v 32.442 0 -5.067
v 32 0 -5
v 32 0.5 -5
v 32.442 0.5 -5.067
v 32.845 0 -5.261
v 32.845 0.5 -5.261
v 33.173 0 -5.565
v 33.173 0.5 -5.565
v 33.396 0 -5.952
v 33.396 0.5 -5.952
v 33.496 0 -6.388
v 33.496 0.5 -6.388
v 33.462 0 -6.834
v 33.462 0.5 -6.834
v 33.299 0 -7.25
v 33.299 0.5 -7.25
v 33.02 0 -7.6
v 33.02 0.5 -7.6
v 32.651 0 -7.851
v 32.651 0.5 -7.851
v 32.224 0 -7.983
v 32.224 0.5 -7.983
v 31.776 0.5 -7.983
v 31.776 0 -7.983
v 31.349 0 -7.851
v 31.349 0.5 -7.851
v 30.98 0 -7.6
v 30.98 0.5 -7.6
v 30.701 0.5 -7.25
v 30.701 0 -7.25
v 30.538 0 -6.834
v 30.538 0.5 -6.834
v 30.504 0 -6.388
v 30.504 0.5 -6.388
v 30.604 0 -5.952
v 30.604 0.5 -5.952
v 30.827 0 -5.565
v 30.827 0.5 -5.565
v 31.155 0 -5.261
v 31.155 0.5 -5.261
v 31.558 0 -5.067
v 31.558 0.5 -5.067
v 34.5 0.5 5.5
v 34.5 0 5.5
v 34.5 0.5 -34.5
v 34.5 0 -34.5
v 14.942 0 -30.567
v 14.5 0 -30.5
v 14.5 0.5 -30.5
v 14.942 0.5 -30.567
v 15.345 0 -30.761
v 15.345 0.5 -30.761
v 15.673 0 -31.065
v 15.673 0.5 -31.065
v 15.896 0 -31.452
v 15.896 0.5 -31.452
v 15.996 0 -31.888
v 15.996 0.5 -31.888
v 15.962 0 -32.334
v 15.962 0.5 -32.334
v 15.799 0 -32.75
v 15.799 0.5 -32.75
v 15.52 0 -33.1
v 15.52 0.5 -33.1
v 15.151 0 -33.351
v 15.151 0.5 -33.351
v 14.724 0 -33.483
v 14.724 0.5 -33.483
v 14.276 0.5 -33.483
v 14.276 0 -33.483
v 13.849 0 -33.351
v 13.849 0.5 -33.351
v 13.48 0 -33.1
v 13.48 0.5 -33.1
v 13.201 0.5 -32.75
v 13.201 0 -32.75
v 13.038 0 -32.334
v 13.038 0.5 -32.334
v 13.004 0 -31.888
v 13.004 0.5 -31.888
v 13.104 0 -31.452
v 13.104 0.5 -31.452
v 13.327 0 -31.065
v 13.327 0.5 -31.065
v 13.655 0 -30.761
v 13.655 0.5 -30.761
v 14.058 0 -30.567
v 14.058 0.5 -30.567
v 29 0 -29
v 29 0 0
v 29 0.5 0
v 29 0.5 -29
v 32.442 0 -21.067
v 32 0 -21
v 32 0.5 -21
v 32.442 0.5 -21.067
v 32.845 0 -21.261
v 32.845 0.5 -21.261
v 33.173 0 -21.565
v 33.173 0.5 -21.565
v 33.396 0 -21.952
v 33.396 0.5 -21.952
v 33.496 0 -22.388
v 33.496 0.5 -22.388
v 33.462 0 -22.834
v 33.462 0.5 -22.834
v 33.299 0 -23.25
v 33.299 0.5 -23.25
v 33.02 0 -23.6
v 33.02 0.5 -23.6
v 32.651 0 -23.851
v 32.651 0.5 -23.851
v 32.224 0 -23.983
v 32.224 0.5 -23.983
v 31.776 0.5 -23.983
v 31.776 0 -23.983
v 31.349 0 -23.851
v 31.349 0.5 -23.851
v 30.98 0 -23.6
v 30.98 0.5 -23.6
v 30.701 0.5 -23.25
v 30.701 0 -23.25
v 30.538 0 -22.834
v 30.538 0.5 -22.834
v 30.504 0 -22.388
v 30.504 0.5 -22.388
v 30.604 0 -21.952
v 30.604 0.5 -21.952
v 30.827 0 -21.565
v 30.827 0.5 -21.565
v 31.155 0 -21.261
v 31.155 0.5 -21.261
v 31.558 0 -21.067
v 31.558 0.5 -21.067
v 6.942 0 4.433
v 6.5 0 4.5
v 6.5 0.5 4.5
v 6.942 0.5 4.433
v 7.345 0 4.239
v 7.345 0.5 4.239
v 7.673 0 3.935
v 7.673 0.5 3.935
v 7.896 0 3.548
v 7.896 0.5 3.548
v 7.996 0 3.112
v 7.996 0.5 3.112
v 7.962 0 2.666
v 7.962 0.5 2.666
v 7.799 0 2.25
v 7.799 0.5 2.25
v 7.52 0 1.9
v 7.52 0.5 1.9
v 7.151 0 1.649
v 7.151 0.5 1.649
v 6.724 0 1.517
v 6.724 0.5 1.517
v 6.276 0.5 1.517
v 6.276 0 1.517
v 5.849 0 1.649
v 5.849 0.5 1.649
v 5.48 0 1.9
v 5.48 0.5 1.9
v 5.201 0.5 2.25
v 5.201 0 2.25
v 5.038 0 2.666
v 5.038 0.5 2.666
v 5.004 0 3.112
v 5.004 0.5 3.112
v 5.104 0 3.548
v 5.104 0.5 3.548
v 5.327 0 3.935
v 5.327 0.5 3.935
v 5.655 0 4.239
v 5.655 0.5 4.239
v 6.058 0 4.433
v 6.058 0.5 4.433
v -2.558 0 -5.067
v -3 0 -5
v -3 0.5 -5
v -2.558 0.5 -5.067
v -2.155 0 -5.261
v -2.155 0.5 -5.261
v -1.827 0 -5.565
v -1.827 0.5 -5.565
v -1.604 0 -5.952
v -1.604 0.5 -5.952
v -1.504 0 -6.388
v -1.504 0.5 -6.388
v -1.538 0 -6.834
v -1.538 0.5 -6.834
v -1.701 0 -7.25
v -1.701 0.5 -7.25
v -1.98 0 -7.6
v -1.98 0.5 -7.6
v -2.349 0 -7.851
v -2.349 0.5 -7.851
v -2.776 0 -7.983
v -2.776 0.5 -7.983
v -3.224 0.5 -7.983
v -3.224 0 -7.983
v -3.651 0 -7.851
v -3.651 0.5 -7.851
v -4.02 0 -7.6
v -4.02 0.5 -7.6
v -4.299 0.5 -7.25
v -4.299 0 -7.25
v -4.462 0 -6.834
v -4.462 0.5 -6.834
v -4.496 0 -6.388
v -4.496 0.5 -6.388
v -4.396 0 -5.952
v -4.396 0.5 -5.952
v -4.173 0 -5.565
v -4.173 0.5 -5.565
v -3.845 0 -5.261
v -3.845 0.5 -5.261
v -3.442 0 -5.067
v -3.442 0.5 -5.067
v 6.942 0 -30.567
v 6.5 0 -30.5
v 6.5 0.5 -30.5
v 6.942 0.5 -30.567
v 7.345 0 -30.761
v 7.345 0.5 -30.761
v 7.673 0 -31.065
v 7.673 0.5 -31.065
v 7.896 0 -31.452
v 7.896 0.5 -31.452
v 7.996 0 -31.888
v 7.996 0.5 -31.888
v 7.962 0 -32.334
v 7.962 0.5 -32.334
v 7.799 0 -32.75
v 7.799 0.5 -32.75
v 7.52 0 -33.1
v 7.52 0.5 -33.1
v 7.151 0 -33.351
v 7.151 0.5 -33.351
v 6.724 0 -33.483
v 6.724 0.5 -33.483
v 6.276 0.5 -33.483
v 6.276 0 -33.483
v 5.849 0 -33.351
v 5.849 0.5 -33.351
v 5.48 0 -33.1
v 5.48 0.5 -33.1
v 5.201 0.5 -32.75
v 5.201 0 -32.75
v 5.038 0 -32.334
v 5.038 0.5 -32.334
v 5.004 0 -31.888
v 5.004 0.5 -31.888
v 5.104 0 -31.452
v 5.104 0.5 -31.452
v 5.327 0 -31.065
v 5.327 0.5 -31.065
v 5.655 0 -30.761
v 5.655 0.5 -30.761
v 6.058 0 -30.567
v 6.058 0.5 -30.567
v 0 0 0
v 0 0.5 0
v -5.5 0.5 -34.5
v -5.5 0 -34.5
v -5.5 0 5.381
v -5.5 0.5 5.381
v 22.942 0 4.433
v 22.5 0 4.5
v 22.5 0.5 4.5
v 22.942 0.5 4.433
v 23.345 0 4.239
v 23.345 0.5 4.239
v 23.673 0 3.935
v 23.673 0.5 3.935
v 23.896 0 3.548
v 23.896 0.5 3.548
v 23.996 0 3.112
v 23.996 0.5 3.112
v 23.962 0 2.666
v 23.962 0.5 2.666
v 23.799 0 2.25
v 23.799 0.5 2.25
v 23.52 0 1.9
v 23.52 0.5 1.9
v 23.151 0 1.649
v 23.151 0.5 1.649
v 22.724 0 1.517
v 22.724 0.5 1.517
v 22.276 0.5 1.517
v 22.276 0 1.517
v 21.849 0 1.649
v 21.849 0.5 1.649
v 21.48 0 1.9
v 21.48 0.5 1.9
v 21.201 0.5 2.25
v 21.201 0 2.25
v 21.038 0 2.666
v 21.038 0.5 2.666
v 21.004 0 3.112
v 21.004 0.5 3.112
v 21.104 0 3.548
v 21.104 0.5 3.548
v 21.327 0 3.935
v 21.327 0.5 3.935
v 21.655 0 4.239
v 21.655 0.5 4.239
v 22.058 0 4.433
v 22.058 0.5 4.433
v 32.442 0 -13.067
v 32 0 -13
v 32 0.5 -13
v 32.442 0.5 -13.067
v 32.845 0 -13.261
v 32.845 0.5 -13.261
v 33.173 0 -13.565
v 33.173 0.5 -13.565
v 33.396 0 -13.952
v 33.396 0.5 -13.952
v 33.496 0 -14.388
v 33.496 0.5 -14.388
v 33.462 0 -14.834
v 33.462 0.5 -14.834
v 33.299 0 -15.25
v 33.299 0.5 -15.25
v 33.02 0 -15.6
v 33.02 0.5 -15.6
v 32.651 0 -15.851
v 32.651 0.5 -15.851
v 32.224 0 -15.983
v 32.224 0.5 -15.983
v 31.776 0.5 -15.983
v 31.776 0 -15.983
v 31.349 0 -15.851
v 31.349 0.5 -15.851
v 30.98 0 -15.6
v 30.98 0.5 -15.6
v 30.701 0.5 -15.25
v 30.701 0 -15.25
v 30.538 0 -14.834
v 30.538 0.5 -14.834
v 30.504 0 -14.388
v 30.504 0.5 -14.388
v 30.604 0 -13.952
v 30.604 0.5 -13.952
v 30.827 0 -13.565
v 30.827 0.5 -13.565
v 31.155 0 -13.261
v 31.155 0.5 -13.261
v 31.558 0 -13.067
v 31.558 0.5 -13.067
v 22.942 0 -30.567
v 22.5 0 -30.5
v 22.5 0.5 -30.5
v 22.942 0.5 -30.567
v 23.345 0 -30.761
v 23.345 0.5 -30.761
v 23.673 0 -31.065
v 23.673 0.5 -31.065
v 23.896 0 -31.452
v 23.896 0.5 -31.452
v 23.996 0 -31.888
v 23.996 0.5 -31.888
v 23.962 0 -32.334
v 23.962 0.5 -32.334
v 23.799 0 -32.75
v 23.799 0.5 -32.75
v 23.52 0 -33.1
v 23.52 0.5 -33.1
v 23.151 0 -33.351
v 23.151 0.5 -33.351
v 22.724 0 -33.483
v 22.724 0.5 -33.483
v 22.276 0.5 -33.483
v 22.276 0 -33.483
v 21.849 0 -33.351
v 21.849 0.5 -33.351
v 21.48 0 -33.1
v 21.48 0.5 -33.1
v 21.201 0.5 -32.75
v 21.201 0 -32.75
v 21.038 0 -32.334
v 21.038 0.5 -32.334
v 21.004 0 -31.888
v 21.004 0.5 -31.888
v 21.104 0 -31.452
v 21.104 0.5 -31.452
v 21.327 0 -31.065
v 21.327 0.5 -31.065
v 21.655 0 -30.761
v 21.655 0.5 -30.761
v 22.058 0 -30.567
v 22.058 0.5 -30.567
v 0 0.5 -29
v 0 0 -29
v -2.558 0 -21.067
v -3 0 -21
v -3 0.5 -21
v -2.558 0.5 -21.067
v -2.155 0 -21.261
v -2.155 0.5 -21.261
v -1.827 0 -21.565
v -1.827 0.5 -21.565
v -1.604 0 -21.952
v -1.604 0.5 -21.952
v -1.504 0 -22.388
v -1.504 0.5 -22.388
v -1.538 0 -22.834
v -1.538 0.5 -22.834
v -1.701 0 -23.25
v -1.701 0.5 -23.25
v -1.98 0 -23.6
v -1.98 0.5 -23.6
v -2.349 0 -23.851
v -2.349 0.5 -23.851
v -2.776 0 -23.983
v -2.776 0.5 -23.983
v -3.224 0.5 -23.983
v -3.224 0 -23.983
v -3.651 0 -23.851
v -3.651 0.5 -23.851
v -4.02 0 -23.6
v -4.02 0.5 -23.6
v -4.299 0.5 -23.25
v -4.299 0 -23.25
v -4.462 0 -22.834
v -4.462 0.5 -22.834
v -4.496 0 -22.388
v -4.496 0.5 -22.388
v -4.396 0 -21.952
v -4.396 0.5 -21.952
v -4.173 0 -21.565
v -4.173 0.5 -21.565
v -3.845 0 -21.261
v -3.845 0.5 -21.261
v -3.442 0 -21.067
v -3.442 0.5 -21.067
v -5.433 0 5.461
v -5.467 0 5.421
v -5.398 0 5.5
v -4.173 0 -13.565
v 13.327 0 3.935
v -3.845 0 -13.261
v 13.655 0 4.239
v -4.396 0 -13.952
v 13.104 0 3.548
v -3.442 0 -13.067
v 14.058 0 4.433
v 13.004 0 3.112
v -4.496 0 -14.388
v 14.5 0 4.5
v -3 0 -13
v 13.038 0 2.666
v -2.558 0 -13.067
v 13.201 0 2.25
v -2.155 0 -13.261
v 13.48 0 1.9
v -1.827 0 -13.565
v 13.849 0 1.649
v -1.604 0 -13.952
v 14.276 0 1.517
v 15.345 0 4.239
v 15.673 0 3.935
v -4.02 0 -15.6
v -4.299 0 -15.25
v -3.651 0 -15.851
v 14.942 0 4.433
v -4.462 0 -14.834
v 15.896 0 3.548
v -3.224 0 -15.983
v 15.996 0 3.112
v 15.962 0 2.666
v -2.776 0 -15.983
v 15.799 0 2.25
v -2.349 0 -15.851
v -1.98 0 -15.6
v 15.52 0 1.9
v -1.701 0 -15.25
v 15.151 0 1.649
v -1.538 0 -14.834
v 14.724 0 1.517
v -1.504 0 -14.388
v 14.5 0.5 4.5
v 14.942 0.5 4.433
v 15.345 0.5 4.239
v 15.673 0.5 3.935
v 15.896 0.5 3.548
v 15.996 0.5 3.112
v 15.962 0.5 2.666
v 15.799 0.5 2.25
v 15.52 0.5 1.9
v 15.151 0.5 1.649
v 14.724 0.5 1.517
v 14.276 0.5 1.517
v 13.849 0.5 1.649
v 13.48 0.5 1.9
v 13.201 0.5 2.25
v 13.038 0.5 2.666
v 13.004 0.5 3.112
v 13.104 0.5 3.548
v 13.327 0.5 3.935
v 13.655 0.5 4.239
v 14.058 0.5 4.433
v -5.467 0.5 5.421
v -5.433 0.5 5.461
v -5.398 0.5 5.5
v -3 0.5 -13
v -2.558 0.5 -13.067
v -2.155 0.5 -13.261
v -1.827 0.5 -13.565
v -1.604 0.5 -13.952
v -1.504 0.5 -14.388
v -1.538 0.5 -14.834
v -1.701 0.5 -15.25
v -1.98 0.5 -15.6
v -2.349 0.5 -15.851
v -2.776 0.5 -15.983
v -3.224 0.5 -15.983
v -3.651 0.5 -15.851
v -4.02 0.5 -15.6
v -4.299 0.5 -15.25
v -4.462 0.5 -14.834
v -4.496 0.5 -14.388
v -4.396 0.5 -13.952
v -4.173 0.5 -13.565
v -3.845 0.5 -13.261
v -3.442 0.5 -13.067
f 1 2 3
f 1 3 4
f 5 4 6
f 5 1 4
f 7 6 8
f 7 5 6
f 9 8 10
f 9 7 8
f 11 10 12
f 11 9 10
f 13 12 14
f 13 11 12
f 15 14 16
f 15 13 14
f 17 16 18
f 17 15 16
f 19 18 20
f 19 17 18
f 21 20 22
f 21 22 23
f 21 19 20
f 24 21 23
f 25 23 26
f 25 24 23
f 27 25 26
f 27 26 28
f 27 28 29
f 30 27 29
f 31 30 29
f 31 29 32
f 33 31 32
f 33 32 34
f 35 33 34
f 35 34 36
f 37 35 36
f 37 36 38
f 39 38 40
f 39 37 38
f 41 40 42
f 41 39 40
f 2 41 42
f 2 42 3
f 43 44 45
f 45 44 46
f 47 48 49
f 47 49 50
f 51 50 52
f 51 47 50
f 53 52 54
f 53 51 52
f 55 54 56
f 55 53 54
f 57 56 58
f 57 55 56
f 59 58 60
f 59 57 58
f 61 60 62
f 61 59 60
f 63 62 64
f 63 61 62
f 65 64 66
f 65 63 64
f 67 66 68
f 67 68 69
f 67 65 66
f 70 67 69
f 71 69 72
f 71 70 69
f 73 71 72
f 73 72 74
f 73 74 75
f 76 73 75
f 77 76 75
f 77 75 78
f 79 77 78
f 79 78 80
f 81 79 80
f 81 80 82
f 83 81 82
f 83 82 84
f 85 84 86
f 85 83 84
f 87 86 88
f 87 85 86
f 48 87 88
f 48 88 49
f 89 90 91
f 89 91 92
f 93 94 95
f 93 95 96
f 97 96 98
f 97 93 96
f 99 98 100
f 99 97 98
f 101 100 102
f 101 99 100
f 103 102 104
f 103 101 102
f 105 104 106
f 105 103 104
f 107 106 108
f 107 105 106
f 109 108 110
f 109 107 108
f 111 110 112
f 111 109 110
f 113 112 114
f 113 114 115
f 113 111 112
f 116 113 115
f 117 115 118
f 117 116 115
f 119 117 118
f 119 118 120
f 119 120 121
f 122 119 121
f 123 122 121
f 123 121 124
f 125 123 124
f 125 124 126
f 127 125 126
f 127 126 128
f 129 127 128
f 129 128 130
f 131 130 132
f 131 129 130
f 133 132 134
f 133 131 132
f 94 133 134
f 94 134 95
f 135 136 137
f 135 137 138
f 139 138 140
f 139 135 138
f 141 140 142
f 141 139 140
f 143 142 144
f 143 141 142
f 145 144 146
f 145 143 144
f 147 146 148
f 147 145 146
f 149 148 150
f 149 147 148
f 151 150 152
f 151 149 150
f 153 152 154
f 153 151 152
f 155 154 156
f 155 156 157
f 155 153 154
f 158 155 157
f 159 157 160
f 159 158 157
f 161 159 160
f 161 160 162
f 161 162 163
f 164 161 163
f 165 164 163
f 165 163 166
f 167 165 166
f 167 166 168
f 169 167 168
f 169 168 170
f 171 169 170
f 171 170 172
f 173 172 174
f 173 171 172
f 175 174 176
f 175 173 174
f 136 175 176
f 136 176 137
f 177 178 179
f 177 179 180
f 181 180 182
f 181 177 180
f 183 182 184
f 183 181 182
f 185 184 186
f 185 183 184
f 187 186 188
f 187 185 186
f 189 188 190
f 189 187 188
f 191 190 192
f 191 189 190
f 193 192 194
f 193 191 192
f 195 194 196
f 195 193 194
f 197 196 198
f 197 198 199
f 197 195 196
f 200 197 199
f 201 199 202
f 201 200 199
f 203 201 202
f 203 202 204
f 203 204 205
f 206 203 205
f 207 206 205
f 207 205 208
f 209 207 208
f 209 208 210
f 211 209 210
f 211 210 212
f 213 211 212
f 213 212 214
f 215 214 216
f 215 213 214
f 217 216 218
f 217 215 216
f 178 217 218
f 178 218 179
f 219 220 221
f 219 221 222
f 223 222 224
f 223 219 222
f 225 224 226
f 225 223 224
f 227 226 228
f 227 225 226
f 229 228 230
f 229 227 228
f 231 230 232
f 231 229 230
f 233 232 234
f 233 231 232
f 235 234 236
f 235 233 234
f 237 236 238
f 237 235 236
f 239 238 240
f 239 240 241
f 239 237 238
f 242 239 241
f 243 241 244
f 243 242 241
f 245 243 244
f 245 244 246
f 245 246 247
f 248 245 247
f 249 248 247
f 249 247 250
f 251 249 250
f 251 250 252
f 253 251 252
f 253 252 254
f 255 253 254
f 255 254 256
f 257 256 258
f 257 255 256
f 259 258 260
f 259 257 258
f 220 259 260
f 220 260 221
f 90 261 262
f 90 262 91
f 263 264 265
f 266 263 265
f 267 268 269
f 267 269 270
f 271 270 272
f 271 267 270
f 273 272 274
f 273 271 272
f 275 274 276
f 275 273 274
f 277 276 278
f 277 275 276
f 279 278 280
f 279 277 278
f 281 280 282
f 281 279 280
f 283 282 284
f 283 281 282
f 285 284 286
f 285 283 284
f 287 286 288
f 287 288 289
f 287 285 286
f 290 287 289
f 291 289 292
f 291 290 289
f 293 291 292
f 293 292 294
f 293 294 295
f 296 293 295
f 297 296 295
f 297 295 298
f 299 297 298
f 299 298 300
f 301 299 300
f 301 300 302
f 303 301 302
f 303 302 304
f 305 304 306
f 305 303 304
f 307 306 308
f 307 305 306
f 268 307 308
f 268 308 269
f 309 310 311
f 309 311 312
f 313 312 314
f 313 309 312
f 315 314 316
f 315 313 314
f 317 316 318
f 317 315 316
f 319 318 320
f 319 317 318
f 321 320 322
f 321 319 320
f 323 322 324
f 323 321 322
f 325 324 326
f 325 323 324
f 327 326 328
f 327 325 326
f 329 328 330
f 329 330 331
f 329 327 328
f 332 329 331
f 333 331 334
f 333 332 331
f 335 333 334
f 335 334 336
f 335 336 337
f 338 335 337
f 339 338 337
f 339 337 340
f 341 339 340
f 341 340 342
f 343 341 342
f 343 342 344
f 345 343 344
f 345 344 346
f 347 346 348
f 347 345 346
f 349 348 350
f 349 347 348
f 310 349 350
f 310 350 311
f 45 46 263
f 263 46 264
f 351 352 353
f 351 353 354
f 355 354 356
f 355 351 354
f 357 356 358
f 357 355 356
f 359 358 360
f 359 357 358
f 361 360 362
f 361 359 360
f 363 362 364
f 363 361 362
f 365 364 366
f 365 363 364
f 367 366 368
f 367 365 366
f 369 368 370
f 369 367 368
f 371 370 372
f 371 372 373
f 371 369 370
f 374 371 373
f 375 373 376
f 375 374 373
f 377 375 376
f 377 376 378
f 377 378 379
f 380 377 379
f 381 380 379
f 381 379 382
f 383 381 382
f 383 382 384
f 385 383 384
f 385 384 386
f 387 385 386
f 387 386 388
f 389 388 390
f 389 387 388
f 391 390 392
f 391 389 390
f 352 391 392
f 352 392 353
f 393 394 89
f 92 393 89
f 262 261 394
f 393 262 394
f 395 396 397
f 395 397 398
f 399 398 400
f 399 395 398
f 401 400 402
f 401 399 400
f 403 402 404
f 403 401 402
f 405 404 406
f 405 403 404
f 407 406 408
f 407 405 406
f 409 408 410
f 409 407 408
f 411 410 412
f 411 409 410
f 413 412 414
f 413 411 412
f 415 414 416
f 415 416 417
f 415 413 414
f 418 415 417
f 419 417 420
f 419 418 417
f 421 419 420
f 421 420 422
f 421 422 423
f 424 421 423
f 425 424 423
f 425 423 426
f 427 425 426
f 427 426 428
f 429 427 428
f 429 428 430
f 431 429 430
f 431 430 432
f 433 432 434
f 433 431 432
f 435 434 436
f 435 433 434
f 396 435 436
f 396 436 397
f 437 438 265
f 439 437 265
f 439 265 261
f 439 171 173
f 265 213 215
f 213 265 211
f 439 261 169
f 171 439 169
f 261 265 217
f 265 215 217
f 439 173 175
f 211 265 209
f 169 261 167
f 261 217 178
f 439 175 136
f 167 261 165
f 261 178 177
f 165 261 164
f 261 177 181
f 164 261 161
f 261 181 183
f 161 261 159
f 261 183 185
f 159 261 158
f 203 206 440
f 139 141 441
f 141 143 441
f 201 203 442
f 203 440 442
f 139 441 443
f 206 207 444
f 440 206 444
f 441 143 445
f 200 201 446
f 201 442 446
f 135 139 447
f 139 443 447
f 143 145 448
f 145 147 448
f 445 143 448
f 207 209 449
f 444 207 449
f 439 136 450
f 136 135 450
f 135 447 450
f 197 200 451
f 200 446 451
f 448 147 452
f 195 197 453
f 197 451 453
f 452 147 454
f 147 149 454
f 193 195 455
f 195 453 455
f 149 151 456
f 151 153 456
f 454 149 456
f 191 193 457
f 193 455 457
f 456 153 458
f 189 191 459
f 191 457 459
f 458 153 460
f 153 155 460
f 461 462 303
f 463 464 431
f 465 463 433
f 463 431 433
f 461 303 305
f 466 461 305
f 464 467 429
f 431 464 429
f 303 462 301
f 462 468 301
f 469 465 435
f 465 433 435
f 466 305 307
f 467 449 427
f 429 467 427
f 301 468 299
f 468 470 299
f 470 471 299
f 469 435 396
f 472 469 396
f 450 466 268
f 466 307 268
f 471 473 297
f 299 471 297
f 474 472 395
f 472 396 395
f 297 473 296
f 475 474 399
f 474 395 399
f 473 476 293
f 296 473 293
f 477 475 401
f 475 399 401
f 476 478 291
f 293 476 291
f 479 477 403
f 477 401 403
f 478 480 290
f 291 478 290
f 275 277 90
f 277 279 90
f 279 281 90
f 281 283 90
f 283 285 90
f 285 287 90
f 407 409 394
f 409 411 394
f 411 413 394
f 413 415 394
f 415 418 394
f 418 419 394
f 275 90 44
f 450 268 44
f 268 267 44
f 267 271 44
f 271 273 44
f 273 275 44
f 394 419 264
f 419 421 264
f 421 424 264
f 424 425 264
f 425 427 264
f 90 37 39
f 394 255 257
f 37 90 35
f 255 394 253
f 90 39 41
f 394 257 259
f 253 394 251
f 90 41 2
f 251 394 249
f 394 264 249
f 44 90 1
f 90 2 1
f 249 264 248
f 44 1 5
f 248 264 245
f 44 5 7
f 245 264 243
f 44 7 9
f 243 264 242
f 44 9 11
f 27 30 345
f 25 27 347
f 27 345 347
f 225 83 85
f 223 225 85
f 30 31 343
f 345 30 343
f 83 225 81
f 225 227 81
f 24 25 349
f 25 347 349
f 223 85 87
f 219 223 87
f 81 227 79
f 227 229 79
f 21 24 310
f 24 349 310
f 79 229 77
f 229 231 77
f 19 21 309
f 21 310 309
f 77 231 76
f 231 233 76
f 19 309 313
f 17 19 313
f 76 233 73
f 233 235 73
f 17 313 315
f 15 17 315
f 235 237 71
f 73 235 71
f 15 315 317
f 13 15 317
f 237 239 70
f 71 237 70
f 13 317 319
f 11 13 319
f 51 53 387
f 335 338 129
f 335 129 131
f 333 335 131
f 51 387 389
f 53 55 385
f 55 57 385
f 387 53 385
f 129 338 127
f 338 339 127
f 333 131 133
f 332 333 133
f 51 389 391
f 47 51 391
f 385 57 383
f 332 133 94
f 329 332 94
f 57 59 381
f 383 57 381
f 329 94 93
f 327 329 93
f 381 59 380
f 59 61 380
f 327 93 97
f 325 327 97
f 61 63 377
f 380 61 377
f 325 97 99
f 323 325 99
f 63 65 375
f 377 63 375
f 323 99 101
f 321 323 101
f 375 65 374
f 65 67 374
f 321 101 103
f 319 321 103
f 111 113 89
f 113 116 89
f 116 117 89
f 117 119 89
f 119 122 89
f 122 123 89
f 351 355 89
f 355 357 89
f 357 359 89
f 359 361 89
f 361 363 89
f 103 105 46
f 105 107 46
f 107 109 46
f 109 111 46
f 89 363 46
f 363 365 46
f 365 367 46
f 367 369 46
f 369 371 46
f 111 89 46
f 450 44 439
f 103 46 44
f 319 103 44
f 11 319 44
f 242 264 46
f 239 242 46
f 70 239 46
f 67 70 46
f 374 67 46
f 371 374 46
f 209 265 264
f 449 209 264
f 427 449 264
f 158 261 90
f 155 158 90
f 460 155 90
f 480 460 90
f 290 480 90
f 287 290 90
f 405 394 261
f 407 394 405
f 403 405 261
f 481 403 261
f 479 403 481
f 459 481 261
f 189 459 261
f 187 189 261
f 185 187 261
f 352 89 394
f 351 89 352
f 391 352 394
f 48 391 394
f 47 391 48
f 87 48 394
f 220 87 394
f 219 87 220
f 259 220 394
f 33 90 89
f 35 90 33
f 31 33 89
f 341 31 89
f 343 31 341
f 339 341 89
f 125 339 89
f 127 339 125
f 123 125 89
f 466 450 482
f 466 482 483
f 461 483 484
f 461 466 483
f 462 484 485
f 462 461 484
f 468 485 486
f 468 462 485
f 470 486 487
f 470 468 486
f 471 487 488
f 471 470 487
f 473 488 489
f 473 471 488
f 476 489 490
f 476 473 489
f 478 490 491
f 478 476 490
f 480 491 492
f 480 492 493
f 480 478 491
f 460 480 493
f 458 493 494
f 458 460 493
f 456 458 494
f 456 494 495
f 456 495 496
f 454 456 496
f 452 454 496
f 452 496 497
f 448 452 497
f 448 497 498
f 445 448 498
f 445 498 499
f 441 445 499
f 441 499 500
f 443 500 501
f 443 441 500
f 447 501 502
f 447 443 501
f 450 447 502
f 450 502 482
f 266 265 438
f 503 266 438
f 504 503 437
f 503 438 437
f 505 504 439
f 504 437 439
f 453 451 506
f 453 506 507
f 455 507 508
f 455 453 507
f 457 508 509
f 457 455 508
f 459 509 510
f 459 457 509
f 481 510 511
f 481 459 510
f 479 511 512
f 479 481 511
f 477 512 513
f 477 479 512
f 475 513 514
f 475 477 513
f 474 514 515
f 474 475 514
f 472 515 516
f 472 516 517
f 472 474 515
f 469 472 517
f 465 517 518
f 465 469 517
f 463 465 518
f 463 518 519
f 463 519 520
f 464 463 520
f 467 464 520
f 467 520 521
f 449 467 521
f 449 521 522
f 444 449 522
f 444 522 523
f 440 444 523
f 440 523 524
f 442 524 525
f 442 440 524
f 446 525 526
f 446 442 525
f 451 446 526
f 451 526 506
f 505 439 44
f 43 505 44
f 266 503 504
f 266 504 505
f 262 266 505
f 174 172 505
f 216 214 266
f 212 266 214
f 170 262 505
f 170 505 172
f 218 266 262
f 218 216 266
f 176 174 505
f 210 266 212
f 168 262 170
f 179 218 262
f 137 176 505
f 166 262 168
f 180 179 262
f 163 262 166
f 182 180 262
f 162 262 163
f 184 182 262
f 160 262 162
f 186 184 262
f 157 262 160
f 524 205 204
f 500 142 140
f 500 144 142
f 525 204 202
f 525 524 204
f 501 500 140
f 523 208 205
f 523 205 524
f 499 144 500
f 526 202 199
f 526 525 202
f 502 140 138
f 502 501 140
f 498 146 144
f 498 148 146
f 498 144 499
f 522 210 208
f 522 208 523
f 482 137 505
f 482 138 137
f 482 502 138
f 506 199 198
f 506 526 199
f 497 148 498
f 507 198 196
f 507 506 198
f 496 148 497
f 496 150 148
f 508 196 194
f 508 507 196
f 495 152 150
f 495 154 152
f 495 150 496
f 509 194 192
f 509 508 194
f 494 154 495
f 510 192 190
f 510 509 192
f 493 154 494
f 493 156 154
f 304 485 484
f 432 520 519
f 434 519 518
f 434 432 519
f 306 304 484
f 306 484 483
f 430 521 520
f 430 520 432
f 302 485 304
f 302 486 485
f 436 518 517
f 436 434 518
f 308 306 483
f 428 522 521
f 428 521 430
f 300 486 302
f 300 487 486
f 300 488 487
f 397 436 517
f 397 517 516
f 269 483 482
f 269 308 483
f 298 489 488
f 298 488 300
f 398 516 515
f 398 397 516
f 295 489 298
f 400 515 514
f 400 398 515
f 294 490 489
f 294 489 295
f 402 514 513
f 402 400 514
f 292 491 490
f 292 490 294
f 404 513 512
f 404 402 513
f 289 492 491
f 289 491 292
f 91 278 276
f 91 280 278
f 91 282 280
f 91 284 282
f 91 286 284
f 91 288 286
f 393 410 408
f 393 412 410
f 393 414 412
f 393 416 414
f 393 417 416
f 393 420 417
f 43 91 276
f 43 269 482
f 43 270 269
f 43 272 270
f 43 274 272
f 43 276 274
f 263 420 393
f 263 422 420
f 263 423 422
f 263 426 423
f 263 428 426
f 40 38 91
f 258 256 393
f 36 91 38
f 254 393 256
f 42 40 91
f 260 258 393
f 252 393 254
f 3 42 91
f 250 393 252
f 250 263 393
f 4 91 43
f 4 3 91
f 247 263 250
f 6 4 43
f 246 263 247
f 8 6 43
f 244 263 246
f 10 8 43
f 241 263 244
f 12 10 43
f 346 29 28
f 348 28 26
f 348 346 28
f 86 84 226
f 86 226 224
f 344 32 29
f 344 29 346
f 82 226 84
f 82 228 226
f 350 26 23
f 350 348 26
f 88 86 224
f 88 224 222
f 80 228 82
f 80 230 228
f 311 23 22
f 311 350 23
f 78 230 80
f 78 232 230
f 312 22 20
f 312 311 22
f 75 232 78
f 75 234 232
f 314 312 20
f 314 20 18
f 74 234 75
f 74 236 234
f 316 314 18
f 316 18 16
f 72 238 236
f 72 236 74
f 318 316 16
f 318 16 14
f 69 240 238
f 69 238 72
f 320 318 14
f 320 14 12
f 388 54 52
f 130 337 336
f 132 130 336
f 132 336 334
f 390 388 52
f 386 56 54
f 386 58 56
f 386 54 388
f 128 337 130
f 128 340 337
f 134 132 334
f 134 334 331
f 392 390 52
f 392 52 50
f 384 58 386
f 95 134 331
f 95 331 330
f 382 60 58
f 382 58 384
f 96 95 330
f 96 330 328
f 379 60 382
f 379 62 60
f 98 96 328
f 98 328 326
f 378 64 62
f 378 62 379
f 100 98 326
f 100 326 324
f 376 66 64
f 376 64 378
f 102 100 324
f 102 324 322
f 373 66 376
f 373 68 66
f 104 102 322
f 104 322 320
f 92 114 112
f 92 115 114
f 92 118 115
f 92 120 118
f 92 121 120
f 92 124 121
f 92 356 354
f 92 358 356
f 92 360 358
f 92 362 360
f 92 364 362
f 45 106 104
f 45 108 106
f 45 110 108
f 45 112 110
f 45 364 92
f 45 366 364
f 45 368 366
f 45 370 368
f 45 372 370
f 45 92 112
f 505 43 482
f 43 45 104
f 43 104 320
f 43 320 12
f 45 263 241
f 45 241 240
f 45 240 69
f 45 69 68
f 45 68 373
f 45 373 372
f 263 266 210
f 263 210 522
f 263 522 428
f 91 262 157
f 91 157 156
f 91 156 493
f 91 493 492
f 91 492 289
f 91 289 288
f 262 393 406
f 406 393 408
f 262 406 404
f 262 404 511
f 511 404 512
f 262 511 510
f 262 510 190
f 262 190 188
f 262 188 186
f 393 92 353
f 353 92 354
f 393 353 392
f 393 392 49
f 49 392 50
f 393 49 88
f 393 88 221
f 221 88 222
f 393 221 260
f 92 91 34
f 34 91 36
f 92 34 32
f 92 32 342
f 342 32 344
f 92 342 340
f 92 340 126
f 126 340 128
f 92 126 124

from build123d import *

# Parameters (mm, degrees)
CROQUIS1_R              = 1.5
CROQUIS1_W              = 29
CROQUIS1_H              = 29
SALIENTE_EXTRUIR1_DEPTH = 0.5


with BuildPart() as part:
    # Croquis1 → Saliente-Extruir1 (new body)
    with BuildSketch(Plane(origin=(0, 0, 0), x_dir=(1, 0, 0), z_dir=(0, 1, 0))):
        with BuildLine():
            ThreePointArc((-5.5, -5.381384118), (-5.449888151, -5.441258419), (-5.398453182, -5.5))
            Line((-5.398453182, -5.5), (34.5, -5.5))
            Line((34.5, -5.5), (34.5, 34.5))
            Line((34.5, 34.5), (-5.5, 34.5))
            Line((-5.5, 34.5), (-5.5, -5.381384118))
        make_face()
        with Locations(Location((6.5, -3, 0), (0, 0, 270))):
            Circle(CROQUIS1_R, mode=Mode.SUBTRACT)
        with Locations(Location((-3, 6.5, 0), (0, 0, 270))):
            Circle(CROQUIS1_R, mode=Mode.SUBTRACT)
        with Locations((14.5, 14.5)):
            Rectangle(CROQUIS1_W, CROQUIS1_H, mode=Mode.SUBTRACT)
        with Locations(Location((14.5, -3, 0), (0, 0, 270))):
            Circle(CROQUIS1_R, mode=Mode.SUBTRACT)
        with Locations(Location((22.5, -3, 0), (0, 0, 270))):
            Circle(CROQUIS1_R, mode=Mode.SUBTRACT)
        with Locations(Location((32, 6.5, 0), (0, 0, 270))):
            Circle(CROQUIS1_R, mode=Mode.SUBTRACT)
        with Locations(Location((32, 14.5, 0), (0, 0, 270))):
            Circle(CROQUIS1_R, mode=Mode.SUBTRACT)
        with Locations(Location((-3, 14.5, 0), (0, 0, 270))):
            Circle(CROQUIS1_R, mode=Mode.SUBTRACT)
        with Locations(Location((-3, 22.5, 0), (0, 0, 270))):
            Circle(CROQUIS1_R, mode=Mode.SUBTRACT)
        with Locations(Location((6.5, 32, 0), (0, 0, 270))):
            Circle(CROQUIS1_R, mode=Mode.SUBTRACT)
        with Locations(Location((32, 22.5, 0), (0, 0, 270))):
            Circle(CROQUIS1_R, mode=Mode.SUBTRACT)
        with Locations(Location((14.5, 32, 0), (0, 0, 270))):
            Circle(CROQUIS1_R, mode=Mode.SUBTRACT)
        with Locations(Location((22.5, 32, 0), (0, 0, 270))):
            Circle(CROQUIS1_R, mode=Mode.SUBTRACT)
    extrude(amount=SALIENTE_EXTRUIR1_DEPTH)


solid = part.part
